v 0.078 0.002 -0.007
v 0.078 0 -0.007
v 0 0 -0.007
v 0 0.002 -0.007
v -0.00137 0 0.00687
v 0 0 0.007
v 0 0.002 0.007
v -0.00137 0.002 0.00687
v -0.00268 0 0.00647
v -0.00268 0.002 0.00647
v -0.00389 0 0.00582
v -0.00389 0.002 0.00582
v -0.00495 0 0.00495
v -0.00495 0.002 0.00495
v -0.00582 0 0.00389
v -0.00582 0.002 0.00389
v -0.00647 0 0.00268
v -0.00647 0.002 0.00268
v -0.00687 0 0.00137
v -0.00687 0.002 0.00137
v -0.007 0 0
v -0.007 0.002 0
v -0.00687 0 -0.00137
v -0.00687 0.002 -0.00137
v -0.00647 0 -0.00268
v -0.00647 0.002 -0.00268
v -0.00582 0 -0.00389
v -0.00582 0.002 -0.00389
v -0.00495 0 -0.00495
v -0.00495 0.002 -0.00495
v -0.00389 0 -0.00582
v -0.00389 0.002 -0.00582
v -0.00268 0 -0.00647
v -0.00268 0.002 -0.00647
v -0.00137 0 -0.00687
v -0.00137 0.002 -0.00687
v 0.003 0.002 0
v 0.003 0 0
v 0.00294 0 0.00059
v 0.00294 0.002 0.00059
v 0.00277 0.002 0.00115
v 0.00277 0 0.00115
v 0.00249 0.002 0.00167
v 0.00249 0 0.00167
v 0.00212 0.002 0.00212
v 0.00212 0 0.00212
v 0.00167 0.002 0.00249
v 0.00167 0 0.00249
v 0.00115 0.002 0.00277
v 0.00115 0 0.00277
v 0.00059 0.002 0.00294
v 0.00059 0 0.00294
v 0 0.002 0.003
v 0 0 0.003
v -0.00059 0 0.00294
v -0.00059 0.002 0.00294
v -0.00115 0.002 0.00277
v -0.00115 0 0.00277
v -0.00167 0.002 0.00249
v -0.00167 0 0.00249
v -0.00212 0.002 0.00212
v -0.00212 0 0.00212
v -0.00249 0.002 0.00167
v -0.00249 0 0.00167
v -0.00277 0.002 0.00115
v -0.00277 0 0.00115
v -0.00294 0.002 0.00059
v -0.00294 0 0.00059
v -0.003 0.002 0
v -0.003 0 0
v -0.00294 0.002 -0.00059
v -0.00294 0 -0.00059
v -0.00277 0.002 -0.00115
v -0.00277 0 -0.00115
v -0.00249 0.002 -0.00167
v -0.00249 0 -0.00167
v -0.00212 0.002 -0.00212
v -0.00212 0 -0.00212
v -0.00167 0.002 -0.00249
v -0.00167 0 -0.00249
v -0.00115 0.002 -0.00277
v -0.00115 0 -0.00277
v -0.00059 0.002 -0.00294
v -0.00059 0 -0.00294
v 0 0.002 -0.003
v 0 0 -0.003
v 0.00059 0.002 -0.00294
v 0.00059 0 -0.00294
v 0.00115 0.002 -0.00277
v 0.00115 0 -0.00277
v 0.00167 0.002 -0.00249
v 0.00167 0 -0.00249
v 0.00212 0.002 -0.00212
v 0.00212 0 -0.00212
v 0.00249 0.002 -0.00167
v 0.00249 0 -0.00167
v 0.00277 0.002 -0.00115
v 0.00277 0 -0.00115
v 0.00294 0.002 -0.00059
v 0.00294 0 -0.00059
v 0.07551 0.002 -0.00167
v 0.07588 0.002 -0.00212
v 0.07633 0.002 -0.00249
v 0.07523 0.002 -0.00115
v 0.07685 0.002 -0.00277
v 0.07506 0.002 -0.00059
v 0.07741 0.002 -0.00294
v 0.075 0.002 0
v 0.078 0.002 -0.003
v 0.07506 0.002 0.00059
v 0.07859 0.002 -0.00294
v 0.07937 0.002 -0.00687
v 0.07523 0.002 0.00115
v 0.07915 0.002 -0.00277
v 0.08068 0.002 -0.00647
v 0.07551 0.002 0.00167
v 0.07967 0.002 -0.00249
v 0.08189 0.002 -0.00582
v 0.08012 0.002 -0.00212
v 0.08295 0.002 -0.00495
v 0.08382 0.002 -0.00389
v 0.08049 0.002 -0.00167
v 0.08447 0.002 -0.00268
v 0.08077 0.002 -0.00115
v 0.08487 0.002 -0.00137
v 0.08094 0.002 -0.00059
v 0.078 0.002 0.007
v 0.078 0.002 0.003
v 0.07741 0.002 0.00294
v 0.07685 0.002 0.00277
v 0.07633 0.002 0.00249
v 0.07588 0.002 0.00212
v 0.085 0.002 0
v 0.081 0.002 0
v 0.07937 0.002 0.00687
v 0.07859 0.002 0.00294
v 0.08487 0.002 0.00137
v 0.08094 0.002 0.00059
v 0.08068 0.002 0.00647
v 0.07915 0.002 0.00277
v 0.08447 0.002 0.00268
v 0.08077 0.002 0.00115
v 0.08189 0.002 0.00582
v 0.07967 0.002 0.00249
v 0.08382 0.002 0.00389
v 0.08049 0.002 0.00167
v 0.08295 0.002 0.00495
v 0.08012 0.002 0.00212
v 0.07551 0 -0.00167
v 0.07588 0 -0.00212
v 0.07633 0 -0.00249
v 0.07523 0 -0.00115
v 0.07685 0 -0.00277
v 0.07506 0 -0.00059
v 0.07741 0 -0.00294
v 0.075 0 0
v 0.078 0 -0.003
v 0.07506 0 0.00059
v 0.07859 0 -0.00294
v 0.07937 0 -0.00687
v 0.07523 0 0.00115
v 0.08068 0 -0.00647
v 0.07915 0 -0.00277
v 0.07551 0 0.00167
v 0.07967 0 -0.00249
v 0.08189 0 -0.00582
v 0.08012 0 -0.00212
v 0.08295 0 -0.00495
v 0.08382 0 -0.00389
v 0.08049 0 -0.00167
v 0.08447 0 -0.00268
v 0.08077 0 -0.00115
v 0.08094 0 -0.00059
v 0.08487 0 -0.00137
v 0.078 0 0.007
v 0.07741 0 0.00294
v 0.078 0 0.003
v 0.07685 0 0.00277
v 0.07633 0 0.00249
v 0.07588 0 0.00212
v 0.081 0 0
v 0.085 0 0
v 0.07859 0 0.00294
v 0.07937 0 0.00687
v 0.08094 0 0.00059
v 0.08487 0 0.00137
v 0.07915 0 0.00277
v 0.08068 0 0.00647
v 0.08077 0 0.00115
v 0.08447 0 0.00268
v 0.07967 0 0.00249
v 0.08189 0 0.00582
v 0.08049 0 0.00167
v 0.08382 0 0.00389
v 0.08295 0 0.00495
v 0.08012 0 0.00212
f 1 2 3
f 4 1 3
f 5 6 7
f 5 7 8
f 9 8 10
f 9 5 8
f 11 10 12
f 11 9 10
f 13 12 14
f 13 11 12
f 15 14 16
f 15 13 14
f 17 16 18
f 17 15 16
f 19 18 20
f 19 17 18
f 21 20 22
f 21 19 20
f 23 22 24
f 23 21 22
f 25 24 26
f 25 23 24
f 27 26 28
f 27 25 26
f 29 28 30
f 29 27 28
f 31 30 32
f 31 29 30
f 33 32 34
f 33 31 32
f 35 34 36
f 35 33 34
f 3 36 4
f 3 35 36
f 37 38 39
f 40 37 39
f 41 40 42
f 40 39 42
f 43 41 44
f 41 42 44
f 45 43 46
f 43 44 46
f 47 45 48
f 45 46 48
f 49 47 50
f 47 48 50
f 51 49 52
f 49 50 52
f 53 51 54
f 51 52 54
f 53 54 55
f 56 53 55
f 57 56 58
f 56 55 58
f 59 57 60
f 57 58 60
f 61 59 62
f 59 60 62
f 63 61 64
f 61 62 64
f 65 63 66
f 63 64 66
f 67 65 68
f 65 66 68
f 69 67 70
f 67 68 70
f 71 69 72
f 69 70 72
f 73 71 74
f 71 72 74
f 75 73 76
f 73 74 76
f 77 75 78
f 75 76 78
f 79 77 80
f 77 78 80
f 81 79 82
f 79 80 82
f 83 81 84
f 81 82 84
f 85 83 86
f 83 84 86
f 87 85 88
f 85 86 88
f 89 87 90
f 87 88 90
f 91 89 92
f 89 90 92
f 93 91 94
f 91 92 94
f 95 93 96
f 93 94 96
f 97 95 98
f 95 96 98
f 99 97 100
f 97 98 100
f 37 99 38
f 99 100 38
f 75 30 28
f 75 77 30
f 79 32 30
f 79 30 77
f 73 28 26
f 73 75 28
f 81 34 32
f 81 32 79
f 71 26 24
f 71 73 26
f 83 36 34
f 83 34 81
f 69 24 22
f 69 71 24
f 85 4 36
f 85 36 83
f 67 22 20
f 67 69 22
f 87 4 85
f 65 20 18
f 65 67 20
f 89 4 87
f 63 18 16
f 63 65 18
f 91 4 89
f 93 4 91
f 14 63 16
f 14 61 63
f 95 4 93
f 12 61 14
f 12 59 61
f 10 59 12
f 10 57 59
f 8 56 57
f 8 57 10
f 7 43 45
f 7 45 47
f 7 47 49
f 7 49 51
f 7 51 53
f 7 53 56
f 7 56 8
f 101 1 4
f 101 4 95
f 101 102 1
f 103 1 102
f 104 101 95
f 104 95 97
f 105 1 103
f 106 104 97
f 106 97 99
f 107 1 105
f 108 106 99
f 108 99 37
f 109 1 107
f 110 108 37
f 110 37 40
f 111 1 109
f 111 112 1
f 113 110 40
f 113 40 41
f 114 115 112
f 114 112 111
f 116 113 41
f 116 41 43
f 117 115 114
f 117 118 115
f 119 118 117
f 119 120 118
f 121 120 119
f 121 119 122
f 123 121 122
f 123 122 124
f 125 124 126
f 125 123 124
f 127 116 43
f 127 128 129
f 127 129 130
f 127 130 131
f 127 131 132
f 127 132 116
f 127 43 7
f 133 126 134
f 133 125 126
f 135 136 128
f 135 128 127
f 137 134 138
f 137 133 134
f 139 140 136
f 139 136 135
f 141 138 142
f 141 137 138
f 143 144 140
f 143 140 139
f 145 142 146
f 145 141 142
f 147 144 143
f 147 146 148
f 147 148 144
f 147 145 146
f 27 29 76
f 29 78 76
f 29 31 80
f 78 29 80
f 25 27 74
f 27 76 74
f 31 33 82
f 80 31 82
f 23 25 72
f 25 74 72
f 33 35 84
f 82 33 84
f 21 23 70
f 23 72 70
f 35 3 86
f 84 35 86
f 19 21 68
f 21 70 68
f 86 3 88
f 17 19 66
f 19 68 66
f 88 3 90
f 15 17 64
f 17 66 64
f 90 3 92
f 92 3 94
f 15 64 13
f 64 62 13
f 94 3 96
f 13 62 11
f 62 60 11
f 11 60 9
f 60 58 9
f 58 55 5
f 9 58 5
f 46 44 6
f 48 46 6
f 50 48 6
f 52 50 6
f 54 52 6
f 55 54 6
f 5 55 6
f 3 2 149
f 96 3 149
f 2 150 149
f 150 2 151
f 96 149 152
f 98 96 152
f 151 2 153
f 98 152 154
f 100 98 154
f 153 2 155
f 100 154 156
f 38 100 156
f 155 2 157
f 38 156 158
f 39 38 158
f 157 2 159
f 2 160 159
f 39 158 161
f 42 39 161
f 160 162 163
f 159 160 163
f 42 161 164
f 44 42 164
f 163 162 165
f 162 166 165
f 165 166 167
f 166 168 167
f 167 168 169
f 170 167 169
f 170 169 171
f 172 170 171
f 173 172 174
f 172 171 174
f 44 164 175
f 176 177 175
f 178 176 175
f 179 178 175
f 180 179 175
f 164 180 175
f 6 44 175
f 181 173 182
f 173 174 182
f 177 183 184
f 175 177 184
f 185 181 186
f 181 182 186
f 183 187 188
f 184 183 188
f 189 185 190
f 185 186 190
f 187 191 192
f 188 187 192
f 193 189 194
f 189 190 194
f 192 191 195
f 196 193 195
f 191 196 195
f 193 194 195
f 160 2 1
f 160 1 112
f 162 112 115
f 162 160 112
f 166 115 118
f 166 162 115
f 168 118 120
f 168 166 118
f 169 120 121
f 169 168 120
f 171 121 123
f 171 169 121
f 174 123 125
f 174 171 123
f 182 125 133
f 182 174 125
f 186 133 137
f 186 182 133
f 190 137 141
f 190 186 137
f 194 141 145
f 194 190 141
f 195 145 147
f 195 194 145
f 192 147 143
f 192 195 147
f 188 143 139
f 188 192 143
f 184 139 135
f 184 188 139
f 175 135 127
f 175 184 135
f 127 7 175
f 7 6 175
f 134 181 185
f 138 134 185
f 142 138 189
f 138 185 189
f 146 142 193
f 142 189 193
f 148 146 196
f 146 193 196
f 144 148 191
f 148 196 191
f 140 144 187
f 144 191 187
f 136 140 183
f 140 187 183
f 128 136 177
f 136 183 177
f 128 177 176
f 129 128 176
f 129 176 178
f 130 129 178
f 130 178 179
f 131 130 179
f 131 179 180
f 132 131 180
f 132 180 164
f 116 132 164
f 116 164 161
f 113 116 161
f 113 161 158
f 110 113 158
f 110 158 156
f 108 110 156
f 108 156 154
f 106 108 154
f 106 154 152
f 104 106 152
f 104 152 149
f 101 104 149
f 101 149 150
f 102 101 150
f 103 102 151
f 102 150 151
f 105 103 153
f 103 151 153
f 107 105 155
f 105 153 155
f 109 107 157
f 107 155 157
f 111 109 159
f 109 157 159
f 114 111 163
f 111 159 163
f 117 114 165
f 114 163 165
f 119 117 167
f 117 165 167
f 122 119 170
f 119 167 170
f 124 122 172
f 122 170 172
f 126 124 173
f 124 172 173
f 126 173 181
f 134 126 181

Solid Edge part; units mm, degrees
sketch "Sketch1" plane through (0, 0, 0) normal (0, -1, 0) x (1, 0, 0)
  circle A0 centre (0.078, 0) radius 0.003
  line L0 (0, 0.007) -> (0.078, 0.007)
  line L1 (0.078, -0.007) -> (0, -0.007)
  arc A1 (0, -0.007) -> (0, 0.007) centre (0, 0) cw
  arc A2 (0.078, 0.007) -> (0.078, -0.007) centre (0.078, 0) cw
  circle A3 centre (0, 0) radius 0.003
extrude "Protrusion1" add sketch "Sketch1" against normal blind 0.002
